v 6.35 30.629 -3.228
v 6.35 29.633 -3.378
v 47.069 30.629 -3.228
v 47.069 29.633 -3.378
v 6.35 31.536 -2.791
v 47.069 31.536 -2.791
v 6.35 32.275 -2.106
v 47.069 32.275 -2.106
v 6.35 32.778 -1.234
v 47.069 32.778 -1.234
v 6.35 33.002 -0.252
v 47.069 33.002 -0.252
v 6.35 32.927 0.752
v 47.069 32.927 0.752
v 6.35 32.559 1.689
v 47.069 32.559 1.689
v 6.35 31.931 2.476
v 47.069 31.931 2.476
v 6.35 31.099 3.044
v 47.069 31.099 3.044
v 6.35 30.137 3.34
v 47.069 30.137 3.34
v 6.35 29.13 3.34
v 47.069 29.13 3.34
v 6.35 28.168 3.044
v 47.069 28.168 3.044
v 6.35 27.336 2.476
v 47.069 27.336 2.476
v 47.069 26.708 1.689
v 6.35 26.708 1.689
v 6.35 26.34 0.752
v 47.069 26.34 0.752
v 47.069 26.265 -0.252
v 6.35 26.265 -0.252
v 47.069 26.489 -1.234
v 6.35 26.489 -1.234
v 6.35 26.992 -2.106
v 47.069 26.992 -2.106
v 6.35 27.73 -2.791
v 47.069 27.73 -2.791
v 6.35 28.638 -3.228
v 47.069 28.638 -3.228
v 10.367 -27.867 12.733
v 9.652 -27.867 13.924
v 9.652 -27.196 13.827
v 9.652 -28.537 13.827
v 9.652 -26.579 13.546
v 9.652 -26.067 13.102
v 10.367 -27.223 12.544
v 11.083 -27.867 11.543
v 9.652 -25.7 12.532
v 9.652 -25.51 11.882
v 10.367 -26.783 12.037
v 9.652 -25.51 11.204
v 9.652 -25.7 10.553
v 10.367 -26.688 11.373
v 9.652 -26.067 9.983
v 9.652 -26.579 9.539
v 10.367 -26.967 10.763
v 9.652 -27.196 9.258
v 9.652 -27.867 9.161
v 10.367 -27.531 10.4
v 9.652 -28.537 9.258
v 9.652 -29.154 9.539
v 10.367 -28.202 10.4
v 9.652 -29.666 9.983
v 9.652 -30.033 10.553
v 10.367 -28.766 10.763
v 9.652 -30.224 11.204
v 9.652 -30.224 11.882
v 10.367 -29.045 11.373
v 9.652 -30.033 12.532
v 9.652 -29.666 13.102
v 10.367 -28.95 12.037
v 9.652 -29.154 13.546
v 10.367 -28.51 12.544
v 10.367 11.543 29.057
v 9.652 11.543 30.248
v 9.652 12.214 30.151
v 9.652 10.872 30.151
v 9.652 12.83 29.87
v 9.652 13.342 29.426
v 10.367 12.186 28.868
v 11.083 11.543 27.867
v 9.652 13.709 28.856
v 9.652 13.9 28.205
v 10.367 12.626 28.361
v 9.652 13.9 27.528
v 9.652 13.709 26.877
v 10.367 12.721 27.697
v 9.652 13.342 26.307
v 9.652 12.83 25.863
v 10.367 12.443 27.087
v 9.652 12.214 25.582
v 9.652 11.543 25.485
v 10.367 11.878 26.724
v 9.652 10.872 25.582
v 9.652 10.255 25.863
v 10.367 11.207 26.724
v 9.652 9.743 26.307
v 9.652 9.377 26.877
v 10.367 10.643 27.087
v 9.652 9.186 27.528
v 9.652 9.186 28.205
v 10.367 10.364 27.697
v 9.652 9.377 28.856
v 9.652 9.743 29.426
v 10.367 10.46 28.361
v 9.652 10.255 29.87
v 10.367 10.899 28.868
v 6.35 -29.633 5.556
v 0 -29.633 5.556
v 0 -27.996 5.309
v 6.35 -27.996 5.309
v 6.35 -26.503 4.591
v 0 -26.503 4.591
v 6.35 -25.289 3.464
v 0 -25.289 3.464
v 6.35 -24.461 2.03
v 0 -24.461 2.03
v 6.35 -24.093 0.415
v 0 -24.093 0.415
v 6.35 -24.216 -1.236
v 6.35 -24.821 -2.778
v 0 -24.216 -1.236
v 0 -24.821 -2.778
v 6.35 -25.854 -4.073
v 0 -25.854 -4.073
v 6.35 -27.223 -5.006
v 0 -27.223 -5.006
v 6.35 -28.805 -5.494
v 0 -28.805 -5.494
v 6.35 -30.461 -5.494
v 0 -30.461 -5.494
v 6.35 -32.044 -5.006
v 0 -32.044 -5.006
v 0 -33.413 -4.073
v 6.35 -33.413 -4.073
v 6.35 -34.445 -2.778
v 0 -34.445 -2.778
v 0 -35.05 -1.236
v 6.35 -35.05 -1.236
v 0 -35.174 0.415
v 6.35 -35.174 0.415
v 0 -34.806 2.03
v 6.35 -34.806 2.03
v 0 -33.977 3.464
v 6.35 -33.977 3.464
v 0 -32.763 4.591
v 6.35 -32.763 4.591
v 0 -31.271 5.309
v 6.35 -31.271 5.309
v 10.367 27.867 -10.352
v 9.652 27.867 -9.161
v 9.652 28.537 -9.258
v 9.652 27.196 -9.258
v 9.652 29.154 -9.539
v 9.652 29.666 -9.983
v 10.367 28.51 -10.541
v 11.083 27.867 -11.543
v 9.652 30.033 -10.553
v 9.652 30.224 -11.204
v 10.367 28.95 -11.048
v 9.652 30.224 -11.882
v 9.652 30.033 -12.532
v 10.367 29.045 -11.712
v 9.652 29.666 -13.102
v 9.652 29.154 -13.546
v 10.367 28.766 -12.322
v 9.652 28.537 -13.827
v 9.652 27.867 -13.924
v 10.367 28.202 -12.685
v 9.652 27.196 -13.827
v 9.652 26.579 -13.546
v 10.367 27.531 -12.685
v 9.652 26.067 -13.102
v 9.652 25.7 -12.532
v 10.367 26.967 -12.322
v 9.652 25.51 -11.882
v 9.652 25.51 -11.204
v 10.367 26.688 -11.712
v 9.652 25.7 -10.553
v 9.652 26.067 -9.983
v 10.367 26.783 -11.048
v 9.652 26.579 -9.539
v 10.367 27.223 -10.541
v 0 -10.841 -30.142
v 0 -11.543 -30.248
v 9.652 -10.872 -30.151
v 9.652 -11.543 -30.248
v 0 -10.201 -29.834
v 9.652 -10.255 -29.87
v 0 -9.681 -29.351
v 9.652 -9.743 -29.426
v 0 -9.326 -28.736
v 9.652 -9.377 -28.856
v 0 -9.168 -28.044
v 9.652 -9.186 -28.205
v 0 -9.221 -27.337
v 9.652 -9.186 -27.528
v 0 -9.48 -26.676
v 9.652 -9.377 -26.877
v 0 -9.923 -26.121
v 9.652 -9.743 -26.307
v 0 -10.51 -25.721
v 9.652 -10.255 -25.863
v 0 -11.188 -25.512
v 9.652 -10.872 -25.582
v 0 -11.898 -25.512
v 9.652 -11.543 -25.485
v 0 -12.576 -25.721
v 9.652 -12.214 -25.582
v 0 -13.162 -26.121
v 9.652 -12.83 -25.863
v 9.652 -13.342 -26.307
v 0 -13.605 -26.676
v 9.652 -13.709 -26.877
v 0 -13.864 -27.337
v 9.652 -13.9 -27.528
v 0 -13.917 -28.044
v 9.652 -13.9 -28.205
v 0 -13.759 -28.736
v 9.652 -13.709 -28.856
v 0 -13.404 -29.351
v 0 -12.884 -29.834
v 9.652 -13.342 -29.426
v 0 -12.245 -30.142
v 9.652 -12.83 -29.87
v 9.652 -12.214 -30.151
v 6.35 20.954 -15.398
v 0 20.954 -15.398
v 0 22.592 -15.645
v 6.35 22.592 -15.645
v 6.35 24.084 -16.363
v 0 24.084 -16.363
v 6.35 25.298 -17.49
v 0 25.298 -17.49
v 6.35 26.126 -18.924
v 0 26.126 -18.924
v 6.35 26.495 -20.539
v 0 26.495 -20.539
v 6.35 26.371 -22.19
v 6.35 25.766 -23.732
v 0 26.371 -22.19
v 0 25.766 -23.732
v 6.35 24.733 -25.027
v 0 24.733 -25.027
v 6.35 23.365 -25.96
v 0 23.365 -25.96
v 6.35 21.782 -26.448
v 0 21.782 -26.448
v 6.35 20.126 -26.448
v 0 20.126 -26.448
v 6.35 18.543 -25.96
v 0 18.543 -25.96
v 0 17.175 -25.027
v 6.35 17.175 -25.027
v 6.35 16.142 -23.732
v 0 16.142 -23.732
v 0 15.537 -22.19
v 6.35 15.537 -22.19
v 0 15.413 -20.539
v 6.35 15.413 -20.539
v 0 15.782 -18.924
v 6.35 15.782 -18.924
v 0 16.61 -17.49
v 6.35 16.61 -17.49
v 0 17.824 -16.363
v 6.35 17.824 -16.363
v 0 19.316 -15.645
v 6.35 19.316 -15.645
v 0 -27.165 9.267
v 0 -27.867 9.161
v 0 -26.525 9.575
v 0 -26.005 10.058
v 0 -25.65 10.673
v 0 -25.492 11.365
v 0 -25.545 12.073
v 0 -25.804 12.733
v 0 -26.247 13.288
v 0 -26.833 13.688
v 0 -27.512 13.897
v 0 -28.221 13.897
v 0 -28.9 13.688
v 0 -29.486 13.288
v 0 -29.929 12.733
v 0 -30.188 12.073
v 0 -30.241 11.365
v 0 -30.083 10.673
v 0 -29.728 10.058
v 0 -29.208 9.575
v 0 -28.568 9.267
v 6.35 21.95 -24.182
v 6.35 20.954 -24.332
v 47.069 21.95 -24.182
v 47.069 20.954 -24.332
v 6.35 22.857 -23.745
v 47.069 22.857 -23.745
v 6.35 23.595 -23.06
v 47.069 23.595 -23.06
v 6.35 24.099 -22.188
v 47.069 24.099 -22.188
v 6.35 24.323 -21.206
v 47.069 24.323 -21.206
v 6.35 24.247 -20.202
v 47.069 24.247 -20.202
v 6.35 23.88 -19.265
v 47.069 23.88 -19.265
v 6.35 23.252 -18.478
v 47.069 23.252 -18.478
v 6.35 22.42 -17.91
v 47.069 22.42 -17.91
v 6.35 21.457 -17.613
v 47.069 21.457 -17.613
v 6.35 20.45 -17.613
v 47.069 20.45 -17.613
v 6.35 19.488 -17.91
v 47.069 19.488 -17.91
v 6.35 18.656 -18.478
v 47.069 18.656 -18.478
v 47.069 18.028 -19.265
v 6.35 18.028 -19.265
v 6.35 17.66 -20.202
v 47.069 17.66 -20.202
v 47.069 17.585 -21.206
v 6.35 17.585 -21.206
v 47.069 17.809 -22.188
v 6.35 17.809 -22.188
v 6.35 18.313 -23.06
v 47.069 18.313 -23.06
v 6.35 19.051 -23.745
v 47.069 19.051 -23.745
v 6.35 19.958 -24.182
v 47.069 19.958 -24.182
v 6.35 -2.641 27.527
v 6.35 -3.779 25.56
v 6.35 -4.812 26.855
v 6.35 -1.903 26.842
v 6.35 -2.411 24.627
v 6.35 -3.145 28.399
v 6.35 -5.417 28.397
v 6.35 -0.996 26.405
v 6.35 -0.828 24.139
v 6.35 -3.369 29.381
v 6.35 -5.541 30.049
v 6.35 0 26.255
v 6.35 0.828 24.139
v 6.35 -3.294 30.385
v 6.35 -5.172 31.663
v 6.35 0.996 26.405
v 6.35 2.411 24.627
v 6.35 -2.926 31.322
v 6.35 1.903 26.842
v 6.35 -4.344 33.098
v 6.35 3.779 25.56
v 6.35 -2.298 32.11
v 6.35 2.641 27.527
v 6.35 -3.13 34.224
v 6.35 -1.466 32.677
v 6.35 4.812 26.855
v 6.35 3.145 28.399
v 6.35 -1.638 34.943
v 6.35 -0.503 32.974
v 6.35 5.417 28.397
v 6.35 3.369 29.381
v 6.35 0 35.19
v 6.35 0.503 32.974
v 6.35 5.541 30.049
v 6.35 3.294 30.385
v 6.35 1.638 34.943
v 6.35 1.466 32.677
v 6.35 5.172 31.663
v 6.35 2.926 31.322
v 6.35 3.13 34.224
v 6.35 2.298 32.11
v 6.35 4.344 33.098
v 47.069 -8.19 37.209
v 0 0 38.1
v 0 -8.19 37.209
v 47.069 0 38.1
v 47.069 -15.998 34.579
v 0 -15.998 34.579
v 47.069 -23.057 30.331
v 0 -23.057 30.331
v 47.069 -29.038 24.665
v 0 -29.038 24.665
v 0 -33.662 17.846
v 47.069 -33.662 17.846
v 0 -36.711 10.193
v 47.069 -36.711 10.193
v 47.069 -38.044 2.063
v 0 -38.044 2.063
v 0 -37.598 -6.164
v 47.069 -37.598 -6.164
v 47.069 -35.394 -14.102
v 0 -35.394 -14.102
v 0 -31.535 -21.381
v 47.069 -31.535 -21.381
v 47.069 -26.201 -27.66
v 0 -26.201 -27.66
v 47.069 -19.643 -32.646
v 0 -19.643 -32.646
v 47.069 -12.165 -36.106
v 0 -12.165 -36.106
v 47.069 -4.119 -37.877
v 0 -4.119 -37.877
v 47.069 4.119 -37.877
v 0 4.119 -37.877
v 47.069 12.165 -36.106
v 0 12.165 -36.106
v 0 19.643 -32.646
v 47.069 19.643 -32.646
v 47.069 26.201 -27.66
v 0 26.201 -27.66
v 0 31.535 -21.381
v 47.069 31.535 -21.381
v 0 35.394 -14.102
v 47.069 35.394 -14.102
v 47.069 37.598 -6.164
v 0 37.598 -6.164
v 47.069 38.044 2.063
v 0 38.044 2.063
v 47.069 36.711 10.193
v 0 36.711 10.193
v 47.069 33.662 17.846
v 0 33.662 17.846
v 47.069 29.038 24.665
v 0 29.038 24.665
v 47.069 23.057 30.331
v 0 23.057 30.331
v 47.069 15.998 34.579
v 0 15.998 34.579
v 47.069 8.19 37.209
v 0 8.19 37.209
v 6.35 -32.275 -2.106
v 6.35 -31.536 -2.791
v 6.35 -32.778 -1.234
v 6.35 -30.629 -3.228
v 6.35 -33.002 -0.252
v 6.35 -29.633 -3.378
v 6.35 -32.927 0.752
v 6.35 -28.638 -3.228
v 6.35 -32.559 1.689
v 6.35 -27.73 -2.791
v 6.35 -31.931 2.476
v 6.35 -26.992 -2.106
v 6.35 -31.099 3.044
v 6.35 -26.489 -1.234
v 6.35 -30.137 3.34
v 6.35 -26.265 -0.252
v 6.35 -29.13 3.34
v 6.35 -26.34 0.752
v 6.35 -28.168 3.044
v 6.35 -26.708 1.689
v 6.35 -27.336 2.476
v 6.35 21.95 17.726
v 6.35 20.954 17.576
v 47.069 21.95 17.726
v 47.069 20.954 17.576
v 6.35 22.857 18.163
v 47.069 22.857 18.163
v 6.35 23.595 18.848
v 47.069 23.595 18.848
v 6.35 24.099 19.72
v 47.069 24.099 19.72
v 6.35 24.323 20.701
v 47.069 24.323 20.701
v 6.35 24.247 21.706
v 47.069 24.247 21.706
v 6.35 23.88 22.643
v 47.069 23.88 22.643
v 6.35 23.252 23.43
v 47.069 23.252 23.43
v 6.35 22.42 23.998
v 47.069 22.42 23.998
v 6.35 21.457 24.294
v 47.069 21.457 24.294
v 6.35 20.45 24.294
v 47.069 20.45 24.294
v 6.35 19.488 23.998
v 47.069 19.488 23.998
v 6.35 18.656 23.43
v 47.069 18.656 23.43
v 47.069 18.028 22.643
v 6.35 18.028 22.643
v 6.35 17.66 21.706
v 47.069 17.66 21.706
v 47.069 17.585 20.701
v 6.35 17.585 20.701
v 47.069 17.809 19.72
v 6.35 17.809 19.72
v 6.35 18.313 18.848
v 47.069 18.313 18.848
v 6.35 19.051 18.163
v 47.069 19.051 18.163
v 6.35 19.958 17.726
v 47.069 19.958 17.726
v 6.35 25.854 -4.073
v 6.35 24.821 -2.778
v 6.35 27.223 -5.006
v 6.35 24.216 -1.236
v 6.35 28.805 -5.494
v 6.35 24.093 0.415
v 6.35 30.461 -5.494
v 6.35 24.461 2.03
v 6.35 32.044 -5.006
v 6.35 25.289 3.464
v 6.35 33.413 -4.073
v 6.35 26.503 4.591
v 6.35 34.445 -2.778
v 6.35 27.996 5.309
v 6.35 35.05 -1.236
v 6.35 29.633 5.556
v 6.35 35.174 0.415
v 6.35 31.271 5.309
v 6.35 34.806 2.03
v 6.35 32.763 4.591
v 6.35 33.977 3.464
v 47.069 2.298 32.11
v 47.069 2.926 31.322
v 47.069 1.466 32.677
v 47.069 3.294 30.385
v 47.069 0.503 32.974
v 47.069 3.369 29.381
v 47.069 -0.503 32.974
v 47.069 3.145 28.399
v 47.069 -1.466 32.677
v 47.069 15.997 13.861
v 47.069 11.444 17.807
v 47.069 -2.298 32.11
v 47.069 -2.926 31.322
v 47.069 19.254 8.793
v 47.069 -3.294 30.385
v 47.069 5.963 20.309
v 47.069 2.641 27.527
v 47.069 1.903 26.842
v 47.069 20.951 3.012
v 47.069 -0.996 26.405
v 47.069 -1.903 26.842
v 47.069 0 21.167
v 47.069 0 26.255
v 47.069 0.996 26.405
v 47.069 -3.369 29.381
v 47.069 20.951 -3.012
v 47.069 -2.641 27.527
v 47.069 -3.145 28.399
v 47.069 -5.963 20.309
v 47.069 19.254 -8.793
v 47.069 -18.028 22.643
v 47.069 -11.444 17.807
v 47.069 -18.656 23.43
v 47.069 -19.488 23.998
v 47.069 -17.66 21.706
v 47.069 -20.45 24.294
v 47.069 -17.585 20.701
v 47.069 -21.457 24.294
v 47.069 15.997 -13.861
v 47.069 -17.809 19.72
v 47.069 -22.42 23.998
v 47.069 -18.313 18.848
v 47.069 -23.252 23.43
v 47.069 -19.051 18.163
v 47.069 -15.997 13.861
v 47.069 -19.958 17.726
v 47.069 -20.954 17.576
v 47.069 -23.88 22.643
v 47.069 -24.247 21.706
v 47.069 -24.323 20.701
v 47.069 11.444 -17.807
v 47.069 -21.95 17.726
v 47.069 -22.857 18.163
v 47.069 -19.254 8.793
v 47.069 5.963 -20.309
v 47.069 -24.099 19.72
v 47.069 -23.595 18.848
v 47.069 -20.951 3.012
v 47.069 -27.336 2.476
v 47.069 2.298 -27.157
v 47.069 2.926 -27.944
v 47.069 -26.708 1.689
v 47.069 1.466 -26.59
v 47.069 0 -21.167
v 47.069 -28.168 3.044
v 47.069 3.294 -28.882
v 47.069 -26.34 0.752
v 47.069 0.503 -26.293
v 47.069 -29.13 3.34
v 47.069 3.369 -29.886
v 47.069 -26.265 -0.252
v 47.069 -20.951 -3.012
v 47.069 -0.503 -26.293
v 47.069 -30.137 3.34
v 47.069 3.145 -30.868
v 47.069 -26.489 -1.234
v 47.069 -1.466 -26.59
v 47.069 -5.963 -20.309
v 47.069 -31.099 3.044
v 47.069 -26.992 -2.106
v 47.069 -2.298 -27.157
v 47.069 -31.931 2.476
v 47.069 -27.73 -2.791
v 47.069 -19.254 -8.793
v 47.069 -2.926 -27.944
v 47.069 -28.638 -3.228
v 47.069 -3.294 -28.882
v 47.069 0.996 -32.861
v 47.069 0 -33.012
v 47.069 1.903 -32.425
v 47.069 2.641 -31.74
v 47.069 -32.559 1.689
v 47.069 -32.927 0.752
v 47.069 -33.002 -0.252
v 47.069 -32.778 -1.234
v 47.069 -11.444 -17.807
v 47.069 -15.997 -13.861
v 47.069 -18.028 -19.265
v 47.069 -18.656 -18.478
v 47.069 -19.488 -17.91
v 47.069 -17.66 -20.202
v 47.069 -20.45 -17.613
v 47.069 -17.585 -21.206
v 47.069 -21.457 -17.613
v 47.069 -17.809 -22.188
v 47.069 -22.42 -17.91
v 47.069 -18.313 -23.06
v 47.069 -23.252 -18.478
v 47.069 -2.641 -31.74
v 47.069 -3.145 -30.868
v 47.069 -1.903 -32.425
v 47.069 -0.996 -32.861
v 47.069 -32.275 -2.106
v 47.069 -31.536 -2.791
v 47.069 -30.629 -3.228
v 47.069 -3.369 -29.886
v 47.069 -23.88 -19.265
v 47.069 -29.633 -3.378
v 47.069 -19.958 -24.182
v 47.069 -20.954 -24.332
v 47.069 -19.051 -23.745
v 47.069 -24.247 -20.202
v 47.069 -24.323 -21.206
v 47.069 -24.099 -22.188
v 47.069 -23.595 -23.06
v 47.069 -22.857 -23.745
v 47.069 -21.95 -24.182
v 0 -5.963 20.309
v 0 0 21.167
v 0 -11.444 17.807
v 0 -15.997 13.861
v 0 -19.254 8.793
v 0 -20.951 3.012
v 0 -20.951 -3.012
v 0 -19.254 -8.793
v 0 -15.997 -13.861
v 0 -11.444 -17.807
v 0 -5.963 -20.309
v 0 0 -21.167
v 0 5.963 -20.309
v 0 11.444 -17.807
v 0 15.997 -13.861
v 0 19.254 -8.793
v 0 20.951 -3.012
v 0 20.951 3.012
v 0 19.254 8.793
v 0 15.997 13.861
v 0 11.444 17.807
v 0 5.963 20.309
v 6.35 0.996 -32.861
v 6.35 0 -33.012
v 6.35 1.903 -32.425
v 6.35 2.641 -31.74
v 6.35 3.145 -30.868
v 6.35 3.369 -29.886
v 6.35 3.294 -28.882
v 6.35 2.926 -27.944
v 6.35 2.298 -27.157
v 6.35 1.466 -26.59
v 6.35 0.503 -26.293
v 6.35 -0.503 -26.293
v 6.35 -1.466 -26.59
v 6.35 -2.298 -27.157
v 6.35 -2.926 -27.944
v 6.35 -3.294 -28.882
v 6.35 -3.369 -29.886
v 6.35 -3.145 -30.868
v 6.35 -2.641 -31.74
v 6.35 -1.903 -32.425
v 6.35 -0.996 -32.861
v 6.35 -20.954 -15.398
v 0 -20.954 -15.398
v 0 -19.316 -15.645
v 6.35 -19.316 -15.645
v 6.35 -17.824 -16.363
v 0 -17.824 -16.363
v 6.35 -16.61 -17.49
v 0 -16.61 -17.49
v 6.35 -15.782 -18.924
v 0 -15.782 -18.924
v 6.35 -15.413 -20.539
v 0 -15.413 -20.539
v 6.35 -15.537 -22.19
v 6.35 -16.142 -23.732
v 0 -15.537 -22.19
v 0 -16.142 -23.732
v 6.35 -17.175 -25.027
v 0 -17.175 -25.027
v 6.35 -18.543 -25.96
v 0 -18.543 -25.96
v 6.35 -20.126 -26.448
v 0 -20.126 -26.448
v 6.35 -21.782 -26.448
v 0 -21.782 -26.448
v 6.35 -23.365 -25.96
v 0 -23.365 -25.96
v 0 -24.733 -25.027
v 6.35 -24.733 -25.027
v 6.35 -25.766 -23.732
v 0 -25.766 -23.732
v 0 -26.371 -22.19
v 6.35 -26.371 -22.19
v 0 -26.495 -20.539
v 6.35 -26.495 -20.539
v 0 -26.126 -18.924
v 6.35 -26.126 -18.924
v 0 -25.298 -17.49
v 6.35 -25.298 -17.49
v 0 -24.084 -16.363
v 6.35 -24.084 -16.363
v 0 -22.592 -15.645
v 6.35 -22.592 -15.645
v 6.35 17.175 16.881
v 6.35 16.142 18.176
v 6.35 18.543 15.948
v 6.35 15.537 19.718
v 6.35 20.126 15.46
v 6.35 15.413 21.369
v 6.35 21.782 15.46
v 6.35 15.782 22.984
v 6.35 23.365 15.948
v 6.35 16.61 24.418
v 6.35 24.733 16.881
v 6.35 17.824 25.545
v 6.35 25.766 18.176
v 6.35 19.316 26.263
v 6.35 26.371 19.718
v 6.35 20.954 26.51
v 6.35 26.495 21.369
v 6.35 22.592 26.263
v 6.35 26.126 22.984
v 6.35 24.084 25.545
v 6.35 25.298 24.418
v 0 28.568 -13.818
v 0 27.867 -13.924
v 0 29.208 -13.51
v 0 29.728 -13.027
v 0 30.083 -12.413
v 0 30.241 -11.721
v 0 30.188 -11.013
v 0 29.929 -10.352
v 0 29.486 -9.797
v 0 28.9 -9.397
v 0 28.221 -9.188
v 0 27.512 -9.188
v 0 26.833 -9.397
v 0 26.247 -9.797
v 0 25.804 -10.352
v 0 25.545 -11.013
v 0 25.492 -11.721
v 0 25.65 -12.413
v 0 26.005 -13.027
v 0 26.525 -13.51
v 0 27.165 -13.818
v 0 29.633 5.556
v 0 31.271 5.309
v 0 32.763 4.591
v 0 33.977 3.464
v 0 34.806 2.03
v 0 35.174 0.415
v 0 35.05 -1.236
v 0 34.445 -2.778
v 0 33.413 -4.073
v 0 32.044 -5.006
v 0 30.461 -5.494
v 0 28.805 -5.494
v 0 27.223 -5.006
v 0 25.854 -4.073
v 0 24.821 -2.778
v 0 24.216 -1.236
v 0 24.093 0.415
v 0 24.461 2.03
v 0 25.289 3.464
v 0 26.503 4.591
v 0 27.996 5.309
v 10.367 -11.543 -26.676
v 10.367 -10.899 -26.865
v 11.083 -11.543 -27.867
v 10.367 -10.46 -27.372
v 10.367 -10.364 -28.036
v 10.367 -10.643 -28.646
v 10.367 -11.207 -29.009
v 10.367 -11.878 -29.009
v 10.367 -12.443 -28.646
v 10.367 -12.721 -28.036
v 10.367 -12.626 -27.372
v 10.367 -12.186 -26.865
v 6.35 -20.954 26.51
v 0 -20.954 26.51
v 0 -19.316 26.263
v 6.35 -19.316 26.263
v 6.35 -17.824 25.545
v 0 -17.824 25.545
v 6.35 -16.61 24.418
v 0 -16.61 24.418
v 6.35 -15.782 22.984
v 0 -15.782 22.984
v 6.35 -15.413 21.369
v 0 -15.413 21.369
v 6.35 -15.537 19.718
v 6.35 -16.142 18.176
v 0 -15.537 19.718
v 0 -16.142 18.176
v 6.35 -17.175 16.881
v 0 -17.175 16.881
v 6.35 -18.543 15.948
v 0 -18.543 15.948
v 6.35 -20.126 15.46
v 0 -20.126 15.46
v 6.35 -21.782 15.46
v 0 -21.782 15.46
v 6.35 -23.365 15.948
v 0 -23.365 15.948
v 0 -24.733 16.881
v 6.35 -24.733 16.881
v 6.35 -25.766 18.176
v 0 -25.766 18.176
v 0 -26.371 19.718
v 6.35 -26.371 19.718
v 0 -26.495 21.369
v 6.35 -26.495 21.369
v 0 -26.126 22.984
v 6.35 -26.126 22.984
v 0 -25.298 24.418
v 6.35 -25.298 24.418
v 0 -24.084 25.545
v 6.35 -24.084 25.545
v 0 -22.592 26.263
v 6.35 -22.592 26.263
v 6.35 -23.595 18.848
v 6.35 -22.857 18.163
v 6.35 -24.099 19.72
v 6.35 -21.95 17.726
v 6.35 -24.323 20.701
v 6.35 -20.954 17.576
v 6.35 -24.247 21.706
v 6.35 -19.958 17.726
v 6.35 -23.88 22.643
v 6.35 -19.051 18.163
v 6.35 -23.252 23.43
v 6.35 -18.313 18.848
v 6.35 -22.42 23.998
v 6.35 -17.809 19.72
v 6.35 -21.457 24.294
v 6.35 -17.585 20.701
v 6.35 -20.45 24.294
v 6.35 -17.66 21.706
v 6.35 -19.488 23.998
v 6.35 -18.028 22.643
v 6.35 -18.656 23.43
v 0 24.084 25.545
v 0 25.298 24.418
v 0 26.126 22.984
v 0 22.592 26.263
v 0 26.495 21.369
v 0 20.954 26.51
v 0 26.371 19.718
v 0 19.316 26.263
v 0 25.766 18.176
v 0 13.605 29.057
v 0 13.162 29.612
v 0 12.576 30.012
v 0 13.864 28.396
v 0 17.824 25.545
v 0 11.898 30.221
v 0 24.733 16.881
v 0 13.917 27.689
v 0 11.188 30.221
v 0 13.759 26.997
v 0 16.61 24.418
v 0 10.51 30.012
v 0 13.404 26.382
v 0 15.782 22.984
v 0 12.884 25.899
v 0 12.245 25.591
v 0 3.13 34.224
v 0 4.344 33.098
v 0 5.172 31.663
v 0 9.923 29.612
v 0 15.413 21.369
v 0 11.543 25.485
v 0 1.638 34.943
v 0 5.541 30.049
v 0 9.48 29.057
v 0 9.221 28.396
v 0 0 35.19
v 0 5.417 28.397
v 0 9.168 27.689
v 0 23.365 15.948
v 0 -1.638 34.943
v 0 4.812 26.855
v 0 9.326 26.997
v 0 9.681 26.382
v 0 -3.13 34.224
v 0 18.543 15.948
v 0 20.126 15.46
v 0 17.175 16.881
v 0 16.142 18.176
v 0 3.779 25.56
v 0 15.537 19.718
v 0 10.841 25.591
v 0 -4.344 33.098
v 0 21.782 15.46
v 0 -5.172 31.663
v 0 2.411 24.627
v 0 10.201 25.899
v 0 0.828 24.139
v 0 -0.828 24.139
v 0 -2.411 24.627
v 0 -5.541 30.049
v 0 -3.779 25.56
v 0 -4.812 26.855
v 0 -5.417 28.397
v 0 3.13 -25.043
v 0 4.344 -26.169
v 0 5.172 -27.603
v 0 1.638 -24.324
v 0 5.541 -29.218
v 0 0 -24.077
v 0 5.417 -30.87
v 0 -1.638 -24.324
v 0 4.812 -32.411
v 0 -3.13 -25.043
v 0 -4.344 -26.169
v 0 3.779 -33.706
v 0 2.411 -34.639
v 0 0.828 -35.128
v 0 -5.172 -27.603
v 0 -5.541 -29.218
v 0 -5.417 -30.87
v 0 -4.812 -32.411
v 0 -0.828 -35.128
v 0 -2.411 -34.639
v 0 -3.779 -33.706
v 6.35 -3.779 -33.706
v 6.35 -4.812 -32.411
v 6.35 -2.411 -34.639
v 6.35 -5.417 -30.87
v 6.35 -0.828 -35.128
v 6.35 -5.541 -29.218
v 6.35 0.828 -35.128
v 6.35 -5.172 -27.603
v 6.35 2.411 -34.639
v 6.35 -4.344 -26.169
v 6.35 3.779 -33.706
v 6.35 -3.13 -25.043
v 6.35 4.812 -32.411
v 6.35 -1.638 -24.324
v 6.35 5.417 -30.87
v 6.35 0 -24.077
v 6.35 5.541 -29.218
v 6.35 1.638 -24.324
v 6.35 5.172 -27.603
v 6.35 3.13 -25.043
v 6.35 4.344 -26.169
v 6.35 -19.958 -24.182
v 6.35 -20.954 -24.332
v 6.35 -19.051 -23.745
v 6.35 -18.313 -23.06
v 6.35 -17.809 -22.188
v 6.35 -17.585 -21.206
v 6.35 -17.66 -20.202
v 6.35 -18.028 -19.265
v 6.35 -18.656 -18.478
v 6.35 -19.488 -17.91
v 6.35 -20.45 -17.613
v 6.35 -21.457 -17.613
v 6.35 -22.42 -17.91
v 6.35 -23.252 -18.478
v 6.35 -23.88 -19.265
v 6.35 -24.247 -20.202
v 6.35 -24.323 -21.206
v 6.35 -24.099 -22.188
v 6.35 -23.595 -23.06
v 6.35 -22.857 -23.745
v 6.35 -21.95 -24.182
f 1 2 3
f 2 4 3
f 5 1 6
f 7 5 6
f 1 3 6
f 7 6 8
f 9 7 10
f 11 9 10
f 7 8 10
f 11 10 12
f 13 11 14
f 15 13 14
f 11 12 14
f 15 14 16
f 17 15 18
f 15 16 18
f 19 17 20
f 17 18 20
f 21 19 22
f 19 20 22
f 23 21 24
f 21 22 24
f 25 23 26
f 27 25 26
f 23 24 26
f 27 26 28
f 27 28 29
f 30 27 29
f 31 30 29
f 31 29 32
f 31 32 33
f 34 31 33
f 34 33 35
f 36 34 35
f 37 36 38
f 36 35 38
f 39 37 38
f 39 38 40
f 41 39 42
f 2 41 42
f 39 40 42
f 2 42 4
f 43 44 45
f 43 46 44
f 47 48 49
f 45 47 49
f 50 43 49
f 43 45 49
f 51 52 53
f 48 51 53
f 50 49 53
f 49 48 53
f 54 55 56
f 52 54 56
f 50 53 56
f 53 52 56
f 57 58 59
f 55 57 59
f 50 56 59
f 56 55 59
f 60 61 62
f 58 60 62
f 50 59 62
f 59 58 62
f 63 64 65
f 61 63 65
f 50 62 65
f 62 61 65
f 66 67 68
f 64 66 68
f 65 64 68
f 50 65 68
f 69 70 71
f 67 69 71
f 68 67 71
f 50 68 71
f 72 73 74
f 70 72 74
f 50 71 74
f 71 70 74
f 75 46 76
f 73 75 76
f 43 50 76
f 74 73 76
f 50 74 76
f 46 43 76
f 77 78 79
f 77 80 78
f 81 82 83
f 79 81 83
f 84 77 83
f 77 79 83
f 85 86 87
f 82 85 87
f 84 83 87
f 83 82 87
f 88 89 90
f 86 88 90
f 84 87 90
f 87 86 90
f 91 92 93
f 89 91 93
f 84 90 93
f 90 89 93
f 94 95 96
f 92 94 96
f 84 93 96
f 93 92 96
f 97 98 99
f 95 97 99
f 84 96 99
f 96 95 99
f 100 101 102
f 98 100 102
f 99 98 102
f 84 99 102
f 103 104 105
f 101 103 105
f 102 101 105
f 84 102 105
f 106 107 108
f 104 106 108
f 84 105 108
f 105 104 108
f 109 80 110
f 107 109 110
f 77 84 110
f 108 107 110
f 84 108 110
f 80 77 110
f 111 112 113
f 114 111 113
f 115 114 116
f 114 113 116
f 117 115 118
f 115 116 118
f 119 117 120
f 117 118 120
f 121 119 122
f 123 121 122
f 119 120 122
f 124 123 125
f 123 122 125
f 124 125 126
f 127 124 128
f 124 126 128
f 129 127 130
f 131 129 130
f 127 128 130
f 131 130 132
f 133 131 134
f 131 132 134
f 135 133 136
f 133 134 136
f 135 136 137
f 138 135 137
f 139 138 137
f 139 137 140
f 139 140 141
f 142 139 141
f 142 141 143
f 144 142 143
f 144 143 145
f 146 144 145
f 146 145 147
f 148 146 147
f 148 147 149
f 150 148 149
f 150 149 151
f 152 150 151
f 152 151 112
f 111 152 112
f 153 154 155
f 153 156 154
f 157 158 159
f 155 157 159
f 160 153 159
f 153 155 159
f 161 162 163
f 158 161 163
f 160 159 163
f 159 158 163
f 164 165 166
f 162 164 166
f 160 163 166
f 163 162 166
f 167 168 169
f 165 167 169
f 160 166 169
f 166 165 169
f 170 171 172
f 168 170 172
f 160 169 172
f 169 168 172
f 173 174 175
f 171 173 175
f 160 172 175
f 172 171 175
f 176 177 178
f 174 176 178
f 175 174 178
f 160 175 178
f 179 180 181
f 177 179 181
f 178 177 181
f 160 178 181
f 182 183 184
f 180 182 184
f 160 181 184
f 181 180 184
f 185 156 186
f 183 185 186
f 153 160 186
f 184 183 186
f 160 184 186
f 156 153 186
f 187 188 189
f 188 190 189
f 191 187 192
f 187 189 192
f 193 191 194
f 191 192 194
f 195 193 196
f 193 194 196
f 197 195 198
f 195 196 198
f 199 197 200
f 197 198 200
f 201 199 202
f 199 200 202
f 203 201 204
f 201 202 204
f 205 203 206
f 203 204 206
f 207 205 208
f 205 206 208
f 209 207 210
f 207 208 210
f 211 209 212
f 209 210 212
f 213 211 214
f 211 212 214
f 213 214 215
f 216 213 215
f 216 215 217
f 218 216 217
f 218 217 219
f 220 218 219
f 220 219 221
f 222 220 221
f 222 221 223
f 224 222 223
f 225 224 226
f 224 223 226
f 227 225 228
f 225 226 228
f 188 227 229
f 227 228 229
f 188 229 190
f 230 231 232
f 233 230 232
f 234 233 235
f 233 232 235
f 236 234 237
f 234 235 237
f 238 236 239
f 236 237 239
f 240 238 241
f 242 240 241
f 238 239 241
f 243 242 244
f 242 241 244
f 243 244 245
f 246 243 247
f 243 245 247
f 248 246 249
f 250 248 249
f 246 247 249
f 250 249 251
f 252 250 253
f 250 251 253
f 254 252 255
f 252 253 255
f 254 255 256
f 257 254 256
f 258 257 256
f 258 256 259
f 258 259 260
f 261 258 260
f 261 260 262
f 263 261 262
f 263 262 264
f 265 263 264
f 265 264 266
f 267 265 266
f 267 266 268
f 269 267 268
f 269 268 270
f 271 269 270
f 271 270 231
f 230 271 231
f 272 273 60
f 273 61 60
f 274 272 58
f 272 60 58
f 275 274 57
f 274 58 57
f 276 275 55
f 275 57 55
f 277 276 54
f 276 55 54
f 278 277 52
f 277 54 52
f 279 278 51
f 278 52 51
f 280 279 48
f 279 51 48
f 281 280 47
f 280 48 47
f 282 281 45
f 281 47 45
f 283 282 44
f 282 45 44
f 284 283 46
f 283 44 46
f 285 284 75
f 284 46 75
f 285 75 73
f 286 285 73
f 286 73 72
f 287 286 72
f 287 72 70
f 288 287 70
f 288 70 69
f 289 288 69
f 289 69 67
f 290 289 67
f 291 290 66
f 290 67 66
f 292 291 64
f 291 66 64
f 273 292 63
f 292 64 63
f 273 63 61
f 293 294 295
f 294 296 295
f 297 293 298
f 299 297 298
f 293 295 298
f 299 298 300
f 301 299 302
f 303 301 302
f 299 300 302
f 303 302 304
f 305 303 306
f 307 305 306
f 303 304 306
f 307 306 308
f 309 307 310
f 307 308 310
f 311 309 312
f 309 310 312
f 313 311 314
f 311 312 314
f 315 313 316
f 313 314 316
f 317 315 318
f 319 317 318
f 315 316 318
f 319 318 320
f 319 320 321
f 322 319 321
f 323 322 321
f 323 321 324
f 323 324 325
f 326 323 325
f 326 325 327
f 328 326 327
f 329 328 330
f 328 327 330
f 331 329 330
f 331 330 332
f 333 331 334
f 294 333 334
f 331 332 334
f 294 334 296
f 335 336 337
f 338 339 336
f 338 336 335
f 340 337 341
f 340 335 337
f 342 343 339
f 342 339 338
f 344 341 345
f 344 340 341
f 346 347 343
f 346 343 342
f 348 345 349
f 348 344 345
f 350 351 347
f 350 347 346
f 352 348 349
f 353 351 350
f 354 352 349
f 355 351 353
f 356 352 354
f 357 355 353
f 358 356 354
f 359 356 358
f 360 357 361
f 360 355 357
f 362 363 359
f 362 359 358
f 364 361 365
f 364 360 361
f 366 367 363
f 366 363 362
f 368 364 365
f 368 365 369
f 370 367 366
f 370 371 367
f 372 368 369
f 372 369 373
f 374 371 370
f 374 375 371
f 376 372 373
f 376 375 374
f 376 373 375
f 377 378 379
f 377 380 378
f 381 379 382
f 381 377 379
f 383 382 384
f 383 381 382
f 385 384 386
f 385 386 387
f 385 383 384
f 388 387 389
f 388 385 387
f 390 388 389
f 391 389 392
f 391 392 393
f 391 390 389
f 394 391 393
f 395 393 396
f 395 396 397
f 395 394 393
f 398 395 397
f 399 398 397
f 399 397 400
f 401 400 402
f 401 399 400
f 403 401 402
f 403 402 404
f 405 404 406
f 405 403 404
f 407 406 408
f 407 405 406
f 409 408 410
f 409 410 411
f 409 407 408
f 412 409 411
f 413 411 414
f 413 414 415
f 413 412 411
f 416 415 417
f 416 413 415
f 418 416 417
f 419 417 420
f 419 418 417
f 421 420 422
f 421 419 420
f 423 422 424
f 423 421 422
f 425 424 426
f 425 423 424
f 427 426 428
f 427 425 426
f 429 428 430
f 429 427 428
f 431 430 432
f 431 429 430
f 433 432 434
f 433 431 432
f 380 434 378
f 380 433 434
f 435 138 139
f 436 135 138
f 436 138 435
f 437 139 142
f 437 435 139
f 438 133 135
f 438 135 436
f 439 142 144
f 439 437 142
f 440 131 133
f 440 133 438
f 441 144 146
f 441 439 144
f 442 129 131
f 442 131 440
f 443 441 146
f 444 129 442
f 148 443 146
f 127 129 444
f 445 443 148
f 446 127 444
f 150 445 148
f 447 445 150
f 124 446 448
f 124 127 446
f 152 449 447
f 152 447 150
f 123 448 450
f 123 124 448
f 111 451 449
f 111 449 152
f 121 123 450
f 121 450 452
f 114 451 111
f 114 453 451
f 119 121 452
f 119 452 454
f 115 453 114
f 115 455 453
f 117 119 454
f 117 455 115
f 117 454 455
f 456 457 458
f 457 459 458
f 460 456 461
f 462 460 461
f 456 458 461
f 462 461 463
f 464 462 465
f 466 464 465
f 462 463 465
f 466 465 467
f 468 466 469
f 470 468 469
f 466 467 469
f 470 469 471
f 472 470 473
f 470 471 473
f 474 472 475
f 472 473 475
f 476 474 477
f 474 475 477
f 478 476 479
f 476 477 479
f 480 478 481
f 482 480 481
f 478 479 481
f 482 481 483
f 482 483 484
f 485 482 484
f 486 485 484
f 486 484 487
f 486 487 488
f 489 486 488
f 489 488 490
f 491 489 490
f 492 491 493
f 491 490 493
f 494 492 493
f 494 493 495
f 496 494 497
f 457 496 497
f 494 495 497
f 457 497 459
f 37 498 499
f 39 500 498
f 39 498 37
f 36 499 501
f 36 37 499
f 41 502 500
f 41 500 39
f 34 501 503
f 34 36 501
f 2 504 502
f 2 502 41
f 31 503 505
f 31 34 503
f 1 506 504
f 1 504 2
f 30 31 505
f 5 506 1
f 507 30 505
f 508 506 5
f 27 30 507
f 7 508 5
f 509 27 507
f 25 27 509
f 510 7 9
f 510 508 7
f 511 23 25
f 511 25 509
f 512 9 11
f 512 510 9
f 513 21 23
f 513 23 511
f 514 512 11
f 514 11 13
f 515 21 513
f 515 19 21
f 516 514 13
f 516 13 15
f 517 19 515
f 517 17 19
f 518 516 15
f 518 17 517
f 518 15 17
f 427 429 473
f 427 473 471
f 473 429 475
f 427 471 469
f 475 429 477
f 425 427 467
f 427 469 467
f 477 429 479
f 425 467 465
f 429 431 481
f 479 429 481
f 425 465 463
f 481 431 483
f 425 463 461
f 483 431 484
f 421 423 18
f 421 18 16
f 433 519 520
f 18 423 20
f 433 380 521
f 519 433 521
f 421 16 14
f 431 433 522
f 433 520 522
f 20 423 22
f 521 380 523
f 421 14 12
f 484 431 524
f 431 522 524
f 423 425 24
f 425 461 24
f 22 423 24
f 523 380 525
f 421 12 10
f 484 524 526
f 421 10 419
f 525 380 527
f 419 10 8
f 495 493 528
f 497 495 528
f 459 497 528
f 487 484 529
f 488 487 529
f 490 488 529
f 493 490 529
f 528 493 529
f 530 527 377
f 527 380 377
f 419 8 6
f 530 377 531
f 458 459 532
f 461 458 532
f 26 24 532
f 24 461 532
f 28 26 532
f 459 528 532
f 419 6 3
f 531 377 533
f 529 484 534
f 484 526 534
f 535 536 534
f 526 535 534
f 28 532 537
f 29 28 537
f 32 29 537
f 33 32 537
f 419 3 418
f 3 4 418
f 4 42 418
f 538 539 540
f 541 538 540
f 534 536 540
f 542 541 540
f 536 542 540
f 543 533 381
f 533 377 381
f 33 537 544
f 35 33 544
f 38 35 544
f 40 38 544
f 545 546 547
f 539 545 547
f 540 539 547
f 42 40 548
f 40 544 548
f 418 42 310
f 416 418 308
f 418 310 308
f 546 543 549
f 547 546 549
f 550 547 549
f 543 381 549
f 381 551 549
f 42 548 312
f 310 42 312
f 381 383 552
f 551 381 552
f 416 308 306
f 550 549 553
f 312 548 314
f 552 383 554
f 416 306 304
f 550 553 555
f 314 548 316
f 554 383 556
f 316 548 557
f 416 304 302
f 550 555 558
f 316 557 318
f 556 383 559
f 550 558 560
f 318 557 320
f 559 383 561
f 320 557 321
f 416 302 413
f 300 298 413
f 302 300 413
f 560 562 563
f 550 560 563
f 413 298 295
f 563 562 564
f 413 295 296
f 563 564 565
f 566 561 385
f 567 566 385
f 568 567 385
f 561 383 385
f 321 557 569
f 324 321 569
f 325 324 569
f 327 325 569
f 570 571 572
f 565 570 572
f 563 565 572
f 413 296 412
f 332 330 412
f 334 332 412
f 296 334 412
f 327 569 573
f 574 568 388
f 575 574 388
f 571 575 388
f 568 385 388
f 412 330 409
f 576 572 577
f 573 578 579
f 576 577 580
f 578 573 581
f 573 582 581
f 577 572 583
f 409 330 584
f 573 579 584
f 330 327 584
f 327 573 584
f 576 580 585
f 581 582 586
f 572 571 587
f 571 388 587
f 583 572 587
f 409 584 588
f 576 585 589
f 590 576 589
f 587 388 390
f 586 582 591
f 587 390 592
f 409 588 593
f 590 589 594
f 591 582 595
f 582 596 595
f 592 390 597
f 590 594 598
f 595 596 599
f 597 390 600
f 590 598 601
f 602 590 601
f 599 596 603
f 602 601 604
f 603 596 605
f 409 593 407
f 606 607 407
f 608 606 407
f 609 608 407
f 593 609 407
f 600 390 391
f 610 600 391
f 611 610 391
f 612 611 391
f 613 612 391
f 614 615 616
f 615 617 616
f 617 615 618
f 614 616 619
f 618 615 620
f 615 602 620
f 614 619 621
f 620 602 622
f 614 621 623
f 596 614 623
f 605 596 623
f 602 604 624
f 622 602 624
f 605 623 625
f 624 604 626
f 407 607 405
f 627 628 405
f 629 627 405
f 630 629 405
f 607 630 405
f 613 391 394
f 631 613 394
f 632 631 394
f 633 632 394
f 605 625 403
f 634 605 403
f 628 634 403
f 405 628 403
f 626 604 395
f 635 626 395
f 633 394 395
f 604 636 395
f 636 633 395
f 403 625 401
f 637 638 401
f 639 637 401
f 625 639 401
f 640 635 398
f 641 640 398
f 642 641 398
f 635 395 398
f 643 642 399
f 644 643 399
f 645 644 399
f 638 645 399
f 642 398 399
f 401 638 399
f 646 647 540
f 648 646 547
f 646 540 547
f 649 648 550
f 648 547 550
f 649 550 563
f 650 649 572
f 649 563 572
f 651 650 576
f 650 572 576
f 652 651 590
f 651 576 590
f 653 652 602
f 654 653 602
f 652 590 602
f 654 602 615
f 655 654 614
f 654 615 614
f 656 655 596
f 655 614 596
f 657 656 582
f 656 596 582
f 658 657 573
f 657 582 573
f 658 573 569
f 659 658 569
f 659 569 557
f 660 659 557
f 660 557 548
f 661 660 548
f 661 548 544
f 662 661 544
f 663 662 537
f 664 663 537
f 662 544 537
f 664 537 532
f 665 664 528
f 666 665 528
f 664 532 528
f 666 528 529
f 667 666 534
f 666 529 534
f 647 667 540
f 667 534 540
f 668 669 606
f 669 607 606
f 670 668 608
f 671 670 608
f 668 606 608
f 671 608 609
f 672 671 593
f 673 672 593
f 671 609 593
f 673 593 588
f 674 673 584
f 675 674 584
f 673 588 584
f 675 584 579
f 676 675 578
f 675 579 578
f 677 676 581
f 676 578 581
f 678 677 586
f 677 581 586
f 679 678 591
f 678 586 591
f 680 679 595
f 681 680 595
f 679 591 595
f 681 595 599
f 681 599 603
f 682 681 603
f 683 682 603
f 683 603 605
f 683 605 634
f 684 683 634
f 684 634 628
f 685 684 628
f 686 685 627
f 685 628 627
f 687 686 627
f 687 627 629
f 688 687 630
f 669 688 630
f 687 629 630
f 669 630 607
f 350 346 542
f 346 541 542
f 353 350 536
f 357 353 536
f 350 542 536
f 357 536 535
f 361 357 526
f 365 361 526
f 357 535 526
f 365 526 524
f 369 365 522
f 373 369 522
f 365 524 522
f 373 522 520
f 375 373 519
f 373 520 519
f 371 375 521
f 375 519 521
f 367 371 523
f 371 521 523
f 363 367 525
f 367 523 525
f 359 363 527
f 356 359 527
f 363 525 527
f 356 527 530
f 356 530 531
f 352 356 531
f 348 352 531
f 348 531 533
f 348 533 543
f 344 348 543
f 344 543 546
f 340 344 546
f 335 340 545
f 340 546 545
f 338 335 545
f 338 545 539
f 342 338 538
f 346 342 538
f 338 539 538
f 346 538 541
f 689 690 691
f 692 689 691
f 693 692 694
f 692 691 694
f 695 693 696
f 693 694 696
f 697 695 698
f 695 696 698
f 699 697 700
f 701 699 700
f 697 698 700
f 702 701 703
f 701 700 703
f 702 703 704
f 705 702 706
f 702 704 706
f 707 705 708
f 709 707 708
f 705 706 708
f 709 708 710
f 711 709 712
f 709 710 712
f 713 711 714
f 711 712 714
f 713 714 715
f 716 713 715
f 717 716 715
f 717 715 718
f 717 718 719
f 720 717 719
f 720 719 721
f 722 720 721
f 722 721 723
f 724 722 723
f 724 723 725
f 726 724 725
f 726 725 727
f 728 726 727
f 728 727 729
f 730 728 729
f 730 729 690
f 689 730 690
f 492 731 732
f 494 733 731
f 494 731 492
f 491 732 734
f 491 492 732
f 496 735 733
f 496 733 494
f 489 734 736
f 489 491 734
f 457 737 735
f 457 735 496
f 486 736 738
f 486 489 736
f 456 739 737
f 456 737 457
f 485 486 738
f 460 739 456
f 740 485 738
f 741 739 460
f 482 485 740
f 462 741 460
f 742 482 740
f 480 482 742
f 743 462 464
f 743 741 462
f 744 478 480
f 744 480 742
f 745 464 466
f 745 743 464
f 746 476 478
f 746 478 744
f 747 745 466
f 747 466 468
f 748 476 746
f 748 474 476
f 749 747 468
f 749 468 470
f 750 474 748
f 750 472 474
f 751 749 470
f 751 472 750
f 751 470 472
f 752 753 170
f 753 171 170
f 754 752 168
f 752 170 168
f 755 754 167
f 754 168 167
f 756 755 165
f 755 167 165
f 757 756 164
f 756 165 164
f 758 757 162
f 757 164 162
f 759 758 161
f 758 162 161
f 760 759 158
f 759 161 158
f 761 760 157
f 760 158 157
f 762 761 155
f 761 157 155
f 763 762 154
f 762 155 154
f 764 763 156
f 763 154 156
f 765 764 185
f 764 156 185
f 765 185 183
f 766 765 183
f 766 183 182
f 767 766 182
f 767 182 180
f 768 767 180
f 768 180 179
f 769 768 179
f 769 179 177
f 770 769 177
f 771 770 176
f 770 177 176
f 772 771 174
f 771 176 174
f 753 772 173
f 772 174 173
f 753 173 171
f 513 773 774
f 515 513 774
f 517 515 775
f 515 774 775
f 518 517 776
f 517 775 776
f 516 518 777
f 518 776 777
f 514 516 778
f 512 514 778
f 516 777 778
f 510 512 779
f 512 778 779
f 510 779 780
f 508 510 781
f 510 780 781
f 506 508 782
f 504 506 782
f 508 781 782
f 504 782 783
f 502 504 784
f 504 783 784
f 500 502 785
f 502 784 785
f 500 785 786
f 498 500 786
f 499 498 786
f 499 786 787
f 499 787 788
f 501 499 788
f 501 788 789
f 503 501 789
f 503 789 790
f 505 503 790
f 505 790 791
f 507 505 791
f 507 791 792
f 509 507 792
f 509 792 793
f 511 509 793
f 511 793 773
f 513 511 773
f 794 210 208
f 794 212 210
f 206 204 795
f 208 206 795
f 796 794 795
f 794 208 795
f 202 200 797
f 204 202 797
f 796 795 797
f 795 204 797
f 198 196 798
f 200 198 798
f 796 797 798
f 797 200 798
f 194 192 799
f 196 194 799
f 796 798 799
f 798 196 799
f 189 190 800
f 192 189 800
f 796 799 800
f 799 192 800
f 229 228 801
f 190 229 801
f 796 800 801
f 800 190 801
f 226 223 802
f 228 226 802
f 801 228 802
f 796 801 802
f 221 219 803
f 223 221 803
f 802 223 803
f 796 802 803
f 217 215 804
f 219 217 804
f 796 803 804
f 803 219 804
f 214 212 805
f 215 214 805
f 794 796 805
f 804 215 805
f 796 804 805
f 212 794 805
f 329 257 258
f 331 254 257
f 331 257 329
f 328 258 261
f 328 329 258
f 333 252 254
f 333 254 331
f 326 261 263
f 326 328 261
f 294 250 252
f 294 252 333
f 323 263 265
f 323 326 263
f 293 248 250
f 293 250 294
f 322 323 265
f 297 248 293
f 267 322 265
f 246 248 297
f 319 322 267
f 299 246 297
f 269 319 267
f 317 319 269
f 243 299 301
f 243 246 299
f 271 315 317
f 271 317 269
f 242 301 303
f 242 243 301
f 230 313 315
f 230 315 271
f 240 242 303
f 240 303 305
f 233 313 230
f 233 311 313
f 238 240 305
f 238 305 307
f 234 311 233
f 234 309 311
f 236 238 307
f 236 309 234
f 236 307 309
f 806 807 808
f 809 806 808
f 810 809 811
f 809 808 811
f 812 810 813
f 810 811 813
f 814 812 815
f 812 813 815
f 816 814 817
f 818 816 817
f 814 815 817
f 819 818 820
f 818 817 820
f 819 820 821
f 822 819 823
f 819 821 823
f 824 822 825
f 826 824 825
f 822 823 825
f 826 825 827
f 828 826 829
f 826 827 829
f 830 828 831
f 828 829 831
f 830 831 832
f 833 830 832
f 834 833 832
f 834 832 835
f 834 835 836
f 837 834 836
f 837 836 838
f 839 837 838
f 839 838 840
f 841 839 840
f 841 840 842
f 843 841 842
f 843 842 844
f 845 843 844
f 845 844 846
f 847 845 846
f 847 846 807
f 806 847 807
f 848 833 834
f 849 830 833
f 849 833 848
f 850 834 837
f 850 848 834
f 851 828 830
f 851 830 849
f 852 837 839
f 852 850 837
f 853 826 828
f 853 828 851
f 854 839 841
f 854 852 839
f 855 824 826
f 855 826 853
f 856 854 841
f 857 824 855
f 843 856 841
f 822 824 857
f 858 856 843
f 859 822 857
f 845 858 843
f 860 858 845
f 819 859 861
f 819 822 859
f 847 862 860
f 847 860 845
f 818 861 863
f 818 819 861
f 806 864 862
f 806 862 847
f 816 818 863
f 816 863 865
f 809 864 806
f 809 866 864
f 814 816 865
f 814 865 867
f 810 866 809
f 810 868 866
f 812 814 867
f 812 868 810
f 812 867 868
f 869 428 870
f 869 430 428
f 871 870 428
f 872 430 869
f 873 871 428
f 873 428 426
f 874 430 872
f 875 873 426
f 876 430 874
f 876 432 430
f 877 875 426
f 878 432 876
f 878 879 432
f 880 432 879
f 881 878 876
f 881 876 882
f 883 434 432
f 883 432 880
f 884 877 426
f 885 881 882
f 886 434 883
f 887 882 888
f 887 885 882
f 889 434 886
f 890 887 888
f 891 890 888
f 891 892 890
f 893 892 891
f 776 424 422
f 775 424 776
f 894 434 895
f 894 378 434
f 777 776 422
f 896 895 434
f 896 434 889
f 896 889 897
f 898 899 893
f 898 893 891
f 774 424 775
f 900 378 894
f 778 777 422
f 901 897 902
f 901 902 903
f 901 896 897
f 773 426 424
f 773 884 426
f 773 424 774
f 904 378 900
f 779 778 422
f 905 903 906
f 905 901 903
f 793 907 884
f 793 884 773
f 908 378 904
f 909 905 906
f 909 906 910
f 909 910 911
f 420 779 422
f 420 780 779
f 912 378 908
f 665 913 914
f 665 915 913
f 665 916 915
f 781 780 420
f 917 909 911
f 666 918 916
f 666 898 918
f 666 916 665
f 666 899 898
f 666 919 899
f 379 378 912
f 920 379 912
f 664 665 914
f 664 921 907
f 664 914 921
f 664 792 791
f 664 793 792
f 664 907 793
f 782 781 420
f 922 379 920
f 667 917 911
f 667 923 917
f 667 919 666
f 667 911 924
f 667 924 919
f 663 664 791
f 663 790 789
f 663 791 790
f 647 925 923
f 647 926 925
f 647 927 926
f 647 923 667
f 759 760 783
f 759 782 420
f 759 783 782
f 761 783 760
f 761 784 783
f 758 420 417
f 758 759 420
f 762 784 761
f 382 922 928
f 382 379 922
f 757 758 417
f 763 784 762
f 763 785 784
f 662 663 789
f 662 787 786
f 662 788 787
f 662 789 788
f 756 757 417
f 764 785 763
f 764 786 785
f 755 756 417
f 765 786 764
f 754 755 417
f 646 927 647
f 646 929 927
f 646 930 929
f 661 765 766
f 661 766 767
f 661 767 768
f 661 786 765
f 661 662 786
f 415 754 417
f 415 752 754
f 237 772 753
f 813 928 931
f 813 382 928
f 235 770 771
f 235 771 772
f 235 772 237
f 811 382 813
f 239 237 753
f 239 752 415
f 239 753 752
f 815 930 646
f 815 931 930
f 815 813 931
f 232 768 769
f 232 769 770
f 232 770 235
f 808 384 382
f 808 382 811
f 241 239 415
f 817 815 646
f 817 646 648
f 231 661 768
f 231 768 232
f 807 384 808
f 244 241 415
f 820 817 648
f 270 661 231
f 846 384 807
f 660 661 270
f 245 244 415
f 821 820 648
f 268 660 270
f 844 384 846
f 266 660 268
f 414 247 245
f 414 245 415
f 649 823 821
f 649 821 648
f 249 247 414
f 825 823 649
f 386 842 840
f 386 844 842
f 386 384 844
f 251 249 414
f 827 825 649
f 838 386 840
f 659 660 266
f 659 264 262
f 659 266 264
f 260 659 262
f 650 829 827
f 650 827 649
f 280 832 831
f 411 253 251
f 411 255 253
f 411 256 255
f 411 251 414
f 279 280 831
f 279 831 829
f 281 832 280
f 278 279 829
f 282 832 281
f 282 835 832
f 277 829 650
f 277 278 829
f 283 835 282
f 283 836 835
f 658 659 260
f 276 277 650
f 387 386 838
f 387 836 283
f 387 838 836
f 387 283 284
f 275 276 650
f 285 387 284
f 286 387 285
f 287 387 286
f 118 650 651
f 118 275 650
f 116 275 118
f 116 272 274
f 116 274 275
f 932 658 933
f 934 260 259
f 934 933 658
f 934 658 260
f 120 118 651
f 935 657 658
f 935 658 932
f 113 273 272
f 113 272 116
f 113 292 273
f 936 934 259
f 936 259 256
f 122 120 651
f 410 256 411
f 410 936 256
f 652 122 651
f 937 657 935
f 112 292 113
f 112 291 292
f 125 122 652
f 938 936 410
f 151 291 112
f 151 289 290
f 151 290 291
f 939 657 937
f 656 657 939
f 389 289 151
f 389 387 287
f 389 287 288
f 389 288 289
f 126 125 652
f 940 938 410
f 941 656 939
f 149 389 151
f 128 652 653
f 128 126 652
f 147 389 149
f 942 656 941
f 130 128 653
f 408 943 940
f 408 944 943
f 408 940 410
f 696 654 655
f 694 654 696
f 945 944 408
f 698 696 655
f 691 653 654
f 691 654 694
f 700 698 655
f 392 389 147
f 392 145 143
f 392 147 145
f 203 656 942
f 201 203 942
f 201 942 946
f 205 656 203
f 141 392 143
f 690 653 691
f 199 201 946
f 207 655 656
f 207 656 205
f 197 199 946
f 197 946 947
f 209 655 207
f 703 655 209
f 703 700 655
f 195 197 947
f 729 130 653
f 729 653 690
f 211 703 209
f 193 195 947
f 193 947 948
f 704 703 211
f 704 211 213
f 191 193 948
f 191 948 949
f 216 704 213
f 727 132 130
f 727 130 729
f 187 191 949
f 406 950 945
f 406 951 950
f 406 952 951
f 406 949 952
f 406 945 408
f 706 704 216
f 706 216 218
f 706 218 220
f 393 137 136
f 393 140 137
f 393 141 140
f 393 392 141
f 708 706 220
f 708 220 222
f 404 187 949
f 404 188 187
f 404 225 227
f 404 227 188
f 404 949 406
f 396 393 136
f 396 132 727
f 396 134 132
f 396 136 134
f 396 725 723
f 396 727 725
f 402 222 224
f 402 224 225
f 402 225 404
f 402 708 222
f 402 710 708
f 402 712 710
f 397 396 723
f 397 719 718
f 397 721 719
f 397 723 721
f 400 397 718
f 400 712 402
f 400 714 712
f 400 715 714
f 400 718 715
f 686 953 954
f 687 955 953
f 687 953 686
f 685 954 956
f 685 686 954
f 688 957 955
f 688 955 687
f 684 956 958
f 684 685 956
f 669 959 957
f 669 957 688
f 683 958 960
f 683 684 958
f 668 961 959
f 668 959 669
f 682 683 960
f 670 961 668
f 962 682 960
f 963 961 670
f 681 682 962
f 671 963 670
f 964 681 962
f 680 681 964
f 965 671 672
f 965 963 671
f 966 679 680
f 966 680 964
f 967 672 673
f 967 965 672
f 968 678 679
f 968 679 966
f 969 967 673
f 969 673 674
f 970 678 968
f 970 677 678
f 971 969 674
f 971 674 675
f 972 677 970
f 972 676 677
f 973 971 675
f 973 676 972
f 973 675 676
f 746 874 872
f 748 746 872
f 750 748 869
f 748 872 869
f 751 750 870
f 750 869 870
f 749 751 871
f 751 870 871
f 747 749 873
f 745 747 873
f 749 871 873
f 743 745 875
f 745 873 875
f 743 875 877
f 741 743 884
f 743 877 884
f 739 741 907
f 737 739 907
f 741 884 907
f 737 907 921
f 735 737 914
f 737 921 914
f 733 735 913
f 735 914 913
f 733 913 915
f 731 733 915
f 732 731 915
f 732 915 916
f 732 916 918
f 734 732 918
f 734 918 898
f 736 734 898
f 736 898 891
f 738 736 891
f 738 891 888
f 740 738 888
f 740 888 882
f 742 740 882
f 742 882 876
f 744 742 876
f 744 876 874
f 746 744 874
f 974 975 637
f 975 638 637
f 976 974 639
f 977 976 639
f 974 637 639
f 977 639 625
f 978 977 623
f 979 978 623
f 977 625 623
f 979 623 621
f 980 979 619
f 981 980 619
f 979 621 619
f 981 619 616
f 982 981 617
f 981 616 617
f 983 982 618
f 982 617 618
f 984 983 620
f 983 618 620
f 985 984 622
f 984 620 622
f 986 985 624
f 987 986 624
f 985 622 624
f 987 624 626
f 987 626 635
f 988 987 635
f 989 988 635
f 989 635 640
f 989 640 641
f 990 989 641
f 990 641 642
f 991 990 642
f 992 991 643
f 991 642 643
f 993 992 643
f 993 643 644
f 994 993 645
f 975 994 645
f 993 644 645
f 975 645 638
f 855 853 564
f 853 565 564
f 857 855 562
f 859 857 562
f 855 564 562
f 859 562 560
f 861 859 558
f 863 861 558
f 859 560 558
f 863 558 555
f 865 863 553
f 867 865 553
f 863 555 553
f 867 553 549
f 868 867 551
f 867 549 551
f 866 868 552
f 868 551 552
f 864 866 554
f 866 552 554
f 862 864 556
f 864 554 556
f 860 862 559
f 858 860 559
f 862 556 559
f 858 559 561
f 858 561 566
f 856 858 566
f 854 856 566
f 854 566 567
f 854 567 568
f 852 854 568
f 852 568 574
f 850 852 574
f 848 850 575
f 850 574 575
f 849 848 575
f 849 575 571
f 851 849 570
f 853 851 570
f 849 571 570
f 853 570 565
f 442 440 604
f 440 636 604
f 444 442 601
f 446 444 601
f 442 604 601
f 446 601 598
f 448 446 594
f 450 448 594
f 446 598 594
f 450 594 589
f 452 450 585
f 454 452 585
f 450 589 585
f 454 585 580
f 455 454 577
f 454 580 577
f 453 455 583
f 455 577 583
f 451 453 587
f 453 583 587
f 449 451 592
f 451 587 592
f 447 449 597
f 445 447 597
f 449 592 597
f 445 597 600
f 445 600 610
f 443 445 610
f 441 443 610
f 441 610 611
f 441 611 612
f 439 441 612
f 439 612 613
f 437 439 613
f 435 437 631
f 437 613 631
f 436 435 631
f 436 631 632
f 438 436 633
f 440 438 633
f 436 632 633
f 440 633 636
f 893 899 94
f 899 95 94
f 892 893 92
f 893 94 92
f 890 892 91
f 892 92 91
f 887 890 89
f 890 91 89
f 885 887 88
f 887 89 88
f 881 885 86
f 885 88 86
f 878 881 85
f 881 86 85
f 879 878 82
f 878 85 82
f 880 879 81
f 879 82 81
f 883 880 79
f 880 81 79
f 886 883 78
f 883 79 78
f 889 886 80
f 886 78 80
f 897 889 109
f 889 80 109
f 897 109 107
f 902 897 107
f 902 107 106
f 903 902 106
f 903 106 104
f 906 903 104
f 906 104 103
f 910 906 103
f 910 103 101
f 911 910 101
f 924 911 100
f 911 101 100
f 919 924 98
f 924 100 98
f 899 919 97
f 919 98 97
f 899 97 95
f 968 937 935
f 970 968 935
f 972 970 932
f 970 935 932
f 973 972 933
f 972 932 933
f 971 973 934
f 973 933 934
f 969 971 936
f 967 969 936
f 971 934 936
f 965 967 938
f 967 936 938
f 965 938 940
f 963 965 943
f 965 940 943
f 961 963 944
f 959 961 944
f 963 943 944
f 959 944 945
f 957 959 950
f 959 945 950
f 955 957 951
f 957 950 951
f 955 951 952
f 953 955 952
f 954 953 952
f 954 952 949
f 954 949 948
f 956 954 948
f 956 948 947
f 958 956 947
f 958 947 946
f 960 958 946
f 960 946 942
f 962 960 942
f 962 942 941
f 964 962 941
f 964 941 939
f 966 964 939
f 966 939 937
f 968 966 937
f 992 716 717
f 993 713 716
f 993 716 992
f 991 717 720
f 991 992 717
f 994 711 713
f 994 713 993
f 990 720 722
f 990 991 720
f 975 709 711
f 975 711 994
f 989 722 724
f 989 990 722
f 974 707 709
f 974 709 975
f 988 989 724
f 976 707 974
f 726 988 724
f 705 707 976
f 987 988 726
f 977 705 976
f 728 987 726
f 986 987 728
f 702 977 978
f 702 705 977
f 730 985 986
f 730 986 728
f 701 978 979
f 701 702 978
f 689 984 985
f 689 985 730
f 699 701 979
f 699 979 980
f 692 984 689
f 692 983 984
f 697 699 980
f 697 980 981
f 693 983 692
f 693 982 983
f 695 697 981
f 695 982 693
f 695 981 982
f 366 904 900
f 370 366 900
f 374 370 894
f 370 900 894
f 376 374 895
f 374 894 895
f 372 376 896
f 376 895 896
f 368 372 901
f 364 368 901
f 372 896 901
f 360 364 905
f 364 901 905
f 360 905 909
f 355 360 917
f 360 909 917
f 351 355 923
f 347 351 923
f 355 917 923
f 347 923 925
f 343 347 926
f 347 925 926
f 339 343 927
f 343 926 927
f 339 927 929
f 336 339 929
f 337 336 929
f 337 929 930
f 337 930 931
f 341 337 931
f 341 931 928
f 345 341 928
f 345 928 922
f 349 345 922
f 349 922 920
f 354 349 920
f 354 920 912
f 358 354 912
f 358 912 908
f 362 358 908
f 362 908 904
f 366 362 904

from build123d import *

# Parameters (mm, degrees)
SKETCH1_W                                        = 47.06874
SKETCH1_H                                        = 16.933333333
CBORE_FOR_1_4_SOCKET_HEAD_CAP_SCREW1_D           = 6.7564
CBORE_FOR_1_4_SOCKET_HEAD_CAP_SCREW1_CBORE_D     = 11.1125
CBORE_FOR_1_4_SOCKET_HEAD_CAP_SCREW1_CBORE_DEPTH = 6.35
F_3_16_0_1875_DOWEL_HOLE1_D                      = 4.7625
F_3_16_0_1875_DOWEL_HOLE1_DEPTH                  = 9.652
F_3_16_0_1875_DOWEL_HOLE1_TIP                    = 1.430799349


with BuildPart() as part:
    # Sketch1 → Revolve1 (revolve)
    with BuildSketch(Plane.XY, mode=Mode.PRIVATE) as revolve1_sk:
        with Locations((23.53437, 29.633333334)):
            Rectangle(SKETCH1_W, SKETCH1_H)
    revolve(revolve1_sk.sketch.rotate(Axis((0, 0, 0), (1, 0, 0)), 90), axis=Axis((0, 0, 0), (1, 0, 0)))

    # CBORE for 1/4 Socket Head Cap Screw1 (through all)
    with Locations(Plane.ZY):
        with Locations((0, 29.633333333), (20.953930949, 20.953930949), (29.633333333, 0), (20.953930949, -20.953930949), (0, -29.633333333), (-20.953930949, -20.953930949), (-29.633333333, 0), (-20.953930949, 20.953930949)):
            CounterBoreHole(CBORE_FOR_1_4_SOCKET_HEAD_CAP_SCREW1_D / 2, CBORE_FOR_1_4_SOCKET_HEAD_CAP_SCREW1_CBORE_D / 2, CBORE_FOR_1_4_SOCKET_HEAD_CAP_SCREW1_CBORE_DEPTH)

    # 3/16 (0.1875) Dowel Hole1
    with Locations(Plane.ZY):
        with Locations((-11.542689029, 27.866516399), (27.866516399, 11.542689029), (11.542689029, -27.866516399), (-27.866516399, -11.542689029)):
            Hole(F_3_16_0_1875_DOWEL_HOLE1_D / 2, depth=F_3_16_0_1875_DOWEL_HOLE1_DEPTH)
            with Locations((0, 0, -(F_3_16_0_1875_DOWEL_HOLE1_DEPTH + F_3_16_0_1875_DOWEL_HOLE1_TIP / 2))):  # 118° drill point
                Cone(0, F_3_16_0_1875_DOWEL_HOLE1_D / 2, F_3_16_0_1875_DOWEL_HOLE1_TIP, mode=Mode.SUBTRACT)


solid = part.part
